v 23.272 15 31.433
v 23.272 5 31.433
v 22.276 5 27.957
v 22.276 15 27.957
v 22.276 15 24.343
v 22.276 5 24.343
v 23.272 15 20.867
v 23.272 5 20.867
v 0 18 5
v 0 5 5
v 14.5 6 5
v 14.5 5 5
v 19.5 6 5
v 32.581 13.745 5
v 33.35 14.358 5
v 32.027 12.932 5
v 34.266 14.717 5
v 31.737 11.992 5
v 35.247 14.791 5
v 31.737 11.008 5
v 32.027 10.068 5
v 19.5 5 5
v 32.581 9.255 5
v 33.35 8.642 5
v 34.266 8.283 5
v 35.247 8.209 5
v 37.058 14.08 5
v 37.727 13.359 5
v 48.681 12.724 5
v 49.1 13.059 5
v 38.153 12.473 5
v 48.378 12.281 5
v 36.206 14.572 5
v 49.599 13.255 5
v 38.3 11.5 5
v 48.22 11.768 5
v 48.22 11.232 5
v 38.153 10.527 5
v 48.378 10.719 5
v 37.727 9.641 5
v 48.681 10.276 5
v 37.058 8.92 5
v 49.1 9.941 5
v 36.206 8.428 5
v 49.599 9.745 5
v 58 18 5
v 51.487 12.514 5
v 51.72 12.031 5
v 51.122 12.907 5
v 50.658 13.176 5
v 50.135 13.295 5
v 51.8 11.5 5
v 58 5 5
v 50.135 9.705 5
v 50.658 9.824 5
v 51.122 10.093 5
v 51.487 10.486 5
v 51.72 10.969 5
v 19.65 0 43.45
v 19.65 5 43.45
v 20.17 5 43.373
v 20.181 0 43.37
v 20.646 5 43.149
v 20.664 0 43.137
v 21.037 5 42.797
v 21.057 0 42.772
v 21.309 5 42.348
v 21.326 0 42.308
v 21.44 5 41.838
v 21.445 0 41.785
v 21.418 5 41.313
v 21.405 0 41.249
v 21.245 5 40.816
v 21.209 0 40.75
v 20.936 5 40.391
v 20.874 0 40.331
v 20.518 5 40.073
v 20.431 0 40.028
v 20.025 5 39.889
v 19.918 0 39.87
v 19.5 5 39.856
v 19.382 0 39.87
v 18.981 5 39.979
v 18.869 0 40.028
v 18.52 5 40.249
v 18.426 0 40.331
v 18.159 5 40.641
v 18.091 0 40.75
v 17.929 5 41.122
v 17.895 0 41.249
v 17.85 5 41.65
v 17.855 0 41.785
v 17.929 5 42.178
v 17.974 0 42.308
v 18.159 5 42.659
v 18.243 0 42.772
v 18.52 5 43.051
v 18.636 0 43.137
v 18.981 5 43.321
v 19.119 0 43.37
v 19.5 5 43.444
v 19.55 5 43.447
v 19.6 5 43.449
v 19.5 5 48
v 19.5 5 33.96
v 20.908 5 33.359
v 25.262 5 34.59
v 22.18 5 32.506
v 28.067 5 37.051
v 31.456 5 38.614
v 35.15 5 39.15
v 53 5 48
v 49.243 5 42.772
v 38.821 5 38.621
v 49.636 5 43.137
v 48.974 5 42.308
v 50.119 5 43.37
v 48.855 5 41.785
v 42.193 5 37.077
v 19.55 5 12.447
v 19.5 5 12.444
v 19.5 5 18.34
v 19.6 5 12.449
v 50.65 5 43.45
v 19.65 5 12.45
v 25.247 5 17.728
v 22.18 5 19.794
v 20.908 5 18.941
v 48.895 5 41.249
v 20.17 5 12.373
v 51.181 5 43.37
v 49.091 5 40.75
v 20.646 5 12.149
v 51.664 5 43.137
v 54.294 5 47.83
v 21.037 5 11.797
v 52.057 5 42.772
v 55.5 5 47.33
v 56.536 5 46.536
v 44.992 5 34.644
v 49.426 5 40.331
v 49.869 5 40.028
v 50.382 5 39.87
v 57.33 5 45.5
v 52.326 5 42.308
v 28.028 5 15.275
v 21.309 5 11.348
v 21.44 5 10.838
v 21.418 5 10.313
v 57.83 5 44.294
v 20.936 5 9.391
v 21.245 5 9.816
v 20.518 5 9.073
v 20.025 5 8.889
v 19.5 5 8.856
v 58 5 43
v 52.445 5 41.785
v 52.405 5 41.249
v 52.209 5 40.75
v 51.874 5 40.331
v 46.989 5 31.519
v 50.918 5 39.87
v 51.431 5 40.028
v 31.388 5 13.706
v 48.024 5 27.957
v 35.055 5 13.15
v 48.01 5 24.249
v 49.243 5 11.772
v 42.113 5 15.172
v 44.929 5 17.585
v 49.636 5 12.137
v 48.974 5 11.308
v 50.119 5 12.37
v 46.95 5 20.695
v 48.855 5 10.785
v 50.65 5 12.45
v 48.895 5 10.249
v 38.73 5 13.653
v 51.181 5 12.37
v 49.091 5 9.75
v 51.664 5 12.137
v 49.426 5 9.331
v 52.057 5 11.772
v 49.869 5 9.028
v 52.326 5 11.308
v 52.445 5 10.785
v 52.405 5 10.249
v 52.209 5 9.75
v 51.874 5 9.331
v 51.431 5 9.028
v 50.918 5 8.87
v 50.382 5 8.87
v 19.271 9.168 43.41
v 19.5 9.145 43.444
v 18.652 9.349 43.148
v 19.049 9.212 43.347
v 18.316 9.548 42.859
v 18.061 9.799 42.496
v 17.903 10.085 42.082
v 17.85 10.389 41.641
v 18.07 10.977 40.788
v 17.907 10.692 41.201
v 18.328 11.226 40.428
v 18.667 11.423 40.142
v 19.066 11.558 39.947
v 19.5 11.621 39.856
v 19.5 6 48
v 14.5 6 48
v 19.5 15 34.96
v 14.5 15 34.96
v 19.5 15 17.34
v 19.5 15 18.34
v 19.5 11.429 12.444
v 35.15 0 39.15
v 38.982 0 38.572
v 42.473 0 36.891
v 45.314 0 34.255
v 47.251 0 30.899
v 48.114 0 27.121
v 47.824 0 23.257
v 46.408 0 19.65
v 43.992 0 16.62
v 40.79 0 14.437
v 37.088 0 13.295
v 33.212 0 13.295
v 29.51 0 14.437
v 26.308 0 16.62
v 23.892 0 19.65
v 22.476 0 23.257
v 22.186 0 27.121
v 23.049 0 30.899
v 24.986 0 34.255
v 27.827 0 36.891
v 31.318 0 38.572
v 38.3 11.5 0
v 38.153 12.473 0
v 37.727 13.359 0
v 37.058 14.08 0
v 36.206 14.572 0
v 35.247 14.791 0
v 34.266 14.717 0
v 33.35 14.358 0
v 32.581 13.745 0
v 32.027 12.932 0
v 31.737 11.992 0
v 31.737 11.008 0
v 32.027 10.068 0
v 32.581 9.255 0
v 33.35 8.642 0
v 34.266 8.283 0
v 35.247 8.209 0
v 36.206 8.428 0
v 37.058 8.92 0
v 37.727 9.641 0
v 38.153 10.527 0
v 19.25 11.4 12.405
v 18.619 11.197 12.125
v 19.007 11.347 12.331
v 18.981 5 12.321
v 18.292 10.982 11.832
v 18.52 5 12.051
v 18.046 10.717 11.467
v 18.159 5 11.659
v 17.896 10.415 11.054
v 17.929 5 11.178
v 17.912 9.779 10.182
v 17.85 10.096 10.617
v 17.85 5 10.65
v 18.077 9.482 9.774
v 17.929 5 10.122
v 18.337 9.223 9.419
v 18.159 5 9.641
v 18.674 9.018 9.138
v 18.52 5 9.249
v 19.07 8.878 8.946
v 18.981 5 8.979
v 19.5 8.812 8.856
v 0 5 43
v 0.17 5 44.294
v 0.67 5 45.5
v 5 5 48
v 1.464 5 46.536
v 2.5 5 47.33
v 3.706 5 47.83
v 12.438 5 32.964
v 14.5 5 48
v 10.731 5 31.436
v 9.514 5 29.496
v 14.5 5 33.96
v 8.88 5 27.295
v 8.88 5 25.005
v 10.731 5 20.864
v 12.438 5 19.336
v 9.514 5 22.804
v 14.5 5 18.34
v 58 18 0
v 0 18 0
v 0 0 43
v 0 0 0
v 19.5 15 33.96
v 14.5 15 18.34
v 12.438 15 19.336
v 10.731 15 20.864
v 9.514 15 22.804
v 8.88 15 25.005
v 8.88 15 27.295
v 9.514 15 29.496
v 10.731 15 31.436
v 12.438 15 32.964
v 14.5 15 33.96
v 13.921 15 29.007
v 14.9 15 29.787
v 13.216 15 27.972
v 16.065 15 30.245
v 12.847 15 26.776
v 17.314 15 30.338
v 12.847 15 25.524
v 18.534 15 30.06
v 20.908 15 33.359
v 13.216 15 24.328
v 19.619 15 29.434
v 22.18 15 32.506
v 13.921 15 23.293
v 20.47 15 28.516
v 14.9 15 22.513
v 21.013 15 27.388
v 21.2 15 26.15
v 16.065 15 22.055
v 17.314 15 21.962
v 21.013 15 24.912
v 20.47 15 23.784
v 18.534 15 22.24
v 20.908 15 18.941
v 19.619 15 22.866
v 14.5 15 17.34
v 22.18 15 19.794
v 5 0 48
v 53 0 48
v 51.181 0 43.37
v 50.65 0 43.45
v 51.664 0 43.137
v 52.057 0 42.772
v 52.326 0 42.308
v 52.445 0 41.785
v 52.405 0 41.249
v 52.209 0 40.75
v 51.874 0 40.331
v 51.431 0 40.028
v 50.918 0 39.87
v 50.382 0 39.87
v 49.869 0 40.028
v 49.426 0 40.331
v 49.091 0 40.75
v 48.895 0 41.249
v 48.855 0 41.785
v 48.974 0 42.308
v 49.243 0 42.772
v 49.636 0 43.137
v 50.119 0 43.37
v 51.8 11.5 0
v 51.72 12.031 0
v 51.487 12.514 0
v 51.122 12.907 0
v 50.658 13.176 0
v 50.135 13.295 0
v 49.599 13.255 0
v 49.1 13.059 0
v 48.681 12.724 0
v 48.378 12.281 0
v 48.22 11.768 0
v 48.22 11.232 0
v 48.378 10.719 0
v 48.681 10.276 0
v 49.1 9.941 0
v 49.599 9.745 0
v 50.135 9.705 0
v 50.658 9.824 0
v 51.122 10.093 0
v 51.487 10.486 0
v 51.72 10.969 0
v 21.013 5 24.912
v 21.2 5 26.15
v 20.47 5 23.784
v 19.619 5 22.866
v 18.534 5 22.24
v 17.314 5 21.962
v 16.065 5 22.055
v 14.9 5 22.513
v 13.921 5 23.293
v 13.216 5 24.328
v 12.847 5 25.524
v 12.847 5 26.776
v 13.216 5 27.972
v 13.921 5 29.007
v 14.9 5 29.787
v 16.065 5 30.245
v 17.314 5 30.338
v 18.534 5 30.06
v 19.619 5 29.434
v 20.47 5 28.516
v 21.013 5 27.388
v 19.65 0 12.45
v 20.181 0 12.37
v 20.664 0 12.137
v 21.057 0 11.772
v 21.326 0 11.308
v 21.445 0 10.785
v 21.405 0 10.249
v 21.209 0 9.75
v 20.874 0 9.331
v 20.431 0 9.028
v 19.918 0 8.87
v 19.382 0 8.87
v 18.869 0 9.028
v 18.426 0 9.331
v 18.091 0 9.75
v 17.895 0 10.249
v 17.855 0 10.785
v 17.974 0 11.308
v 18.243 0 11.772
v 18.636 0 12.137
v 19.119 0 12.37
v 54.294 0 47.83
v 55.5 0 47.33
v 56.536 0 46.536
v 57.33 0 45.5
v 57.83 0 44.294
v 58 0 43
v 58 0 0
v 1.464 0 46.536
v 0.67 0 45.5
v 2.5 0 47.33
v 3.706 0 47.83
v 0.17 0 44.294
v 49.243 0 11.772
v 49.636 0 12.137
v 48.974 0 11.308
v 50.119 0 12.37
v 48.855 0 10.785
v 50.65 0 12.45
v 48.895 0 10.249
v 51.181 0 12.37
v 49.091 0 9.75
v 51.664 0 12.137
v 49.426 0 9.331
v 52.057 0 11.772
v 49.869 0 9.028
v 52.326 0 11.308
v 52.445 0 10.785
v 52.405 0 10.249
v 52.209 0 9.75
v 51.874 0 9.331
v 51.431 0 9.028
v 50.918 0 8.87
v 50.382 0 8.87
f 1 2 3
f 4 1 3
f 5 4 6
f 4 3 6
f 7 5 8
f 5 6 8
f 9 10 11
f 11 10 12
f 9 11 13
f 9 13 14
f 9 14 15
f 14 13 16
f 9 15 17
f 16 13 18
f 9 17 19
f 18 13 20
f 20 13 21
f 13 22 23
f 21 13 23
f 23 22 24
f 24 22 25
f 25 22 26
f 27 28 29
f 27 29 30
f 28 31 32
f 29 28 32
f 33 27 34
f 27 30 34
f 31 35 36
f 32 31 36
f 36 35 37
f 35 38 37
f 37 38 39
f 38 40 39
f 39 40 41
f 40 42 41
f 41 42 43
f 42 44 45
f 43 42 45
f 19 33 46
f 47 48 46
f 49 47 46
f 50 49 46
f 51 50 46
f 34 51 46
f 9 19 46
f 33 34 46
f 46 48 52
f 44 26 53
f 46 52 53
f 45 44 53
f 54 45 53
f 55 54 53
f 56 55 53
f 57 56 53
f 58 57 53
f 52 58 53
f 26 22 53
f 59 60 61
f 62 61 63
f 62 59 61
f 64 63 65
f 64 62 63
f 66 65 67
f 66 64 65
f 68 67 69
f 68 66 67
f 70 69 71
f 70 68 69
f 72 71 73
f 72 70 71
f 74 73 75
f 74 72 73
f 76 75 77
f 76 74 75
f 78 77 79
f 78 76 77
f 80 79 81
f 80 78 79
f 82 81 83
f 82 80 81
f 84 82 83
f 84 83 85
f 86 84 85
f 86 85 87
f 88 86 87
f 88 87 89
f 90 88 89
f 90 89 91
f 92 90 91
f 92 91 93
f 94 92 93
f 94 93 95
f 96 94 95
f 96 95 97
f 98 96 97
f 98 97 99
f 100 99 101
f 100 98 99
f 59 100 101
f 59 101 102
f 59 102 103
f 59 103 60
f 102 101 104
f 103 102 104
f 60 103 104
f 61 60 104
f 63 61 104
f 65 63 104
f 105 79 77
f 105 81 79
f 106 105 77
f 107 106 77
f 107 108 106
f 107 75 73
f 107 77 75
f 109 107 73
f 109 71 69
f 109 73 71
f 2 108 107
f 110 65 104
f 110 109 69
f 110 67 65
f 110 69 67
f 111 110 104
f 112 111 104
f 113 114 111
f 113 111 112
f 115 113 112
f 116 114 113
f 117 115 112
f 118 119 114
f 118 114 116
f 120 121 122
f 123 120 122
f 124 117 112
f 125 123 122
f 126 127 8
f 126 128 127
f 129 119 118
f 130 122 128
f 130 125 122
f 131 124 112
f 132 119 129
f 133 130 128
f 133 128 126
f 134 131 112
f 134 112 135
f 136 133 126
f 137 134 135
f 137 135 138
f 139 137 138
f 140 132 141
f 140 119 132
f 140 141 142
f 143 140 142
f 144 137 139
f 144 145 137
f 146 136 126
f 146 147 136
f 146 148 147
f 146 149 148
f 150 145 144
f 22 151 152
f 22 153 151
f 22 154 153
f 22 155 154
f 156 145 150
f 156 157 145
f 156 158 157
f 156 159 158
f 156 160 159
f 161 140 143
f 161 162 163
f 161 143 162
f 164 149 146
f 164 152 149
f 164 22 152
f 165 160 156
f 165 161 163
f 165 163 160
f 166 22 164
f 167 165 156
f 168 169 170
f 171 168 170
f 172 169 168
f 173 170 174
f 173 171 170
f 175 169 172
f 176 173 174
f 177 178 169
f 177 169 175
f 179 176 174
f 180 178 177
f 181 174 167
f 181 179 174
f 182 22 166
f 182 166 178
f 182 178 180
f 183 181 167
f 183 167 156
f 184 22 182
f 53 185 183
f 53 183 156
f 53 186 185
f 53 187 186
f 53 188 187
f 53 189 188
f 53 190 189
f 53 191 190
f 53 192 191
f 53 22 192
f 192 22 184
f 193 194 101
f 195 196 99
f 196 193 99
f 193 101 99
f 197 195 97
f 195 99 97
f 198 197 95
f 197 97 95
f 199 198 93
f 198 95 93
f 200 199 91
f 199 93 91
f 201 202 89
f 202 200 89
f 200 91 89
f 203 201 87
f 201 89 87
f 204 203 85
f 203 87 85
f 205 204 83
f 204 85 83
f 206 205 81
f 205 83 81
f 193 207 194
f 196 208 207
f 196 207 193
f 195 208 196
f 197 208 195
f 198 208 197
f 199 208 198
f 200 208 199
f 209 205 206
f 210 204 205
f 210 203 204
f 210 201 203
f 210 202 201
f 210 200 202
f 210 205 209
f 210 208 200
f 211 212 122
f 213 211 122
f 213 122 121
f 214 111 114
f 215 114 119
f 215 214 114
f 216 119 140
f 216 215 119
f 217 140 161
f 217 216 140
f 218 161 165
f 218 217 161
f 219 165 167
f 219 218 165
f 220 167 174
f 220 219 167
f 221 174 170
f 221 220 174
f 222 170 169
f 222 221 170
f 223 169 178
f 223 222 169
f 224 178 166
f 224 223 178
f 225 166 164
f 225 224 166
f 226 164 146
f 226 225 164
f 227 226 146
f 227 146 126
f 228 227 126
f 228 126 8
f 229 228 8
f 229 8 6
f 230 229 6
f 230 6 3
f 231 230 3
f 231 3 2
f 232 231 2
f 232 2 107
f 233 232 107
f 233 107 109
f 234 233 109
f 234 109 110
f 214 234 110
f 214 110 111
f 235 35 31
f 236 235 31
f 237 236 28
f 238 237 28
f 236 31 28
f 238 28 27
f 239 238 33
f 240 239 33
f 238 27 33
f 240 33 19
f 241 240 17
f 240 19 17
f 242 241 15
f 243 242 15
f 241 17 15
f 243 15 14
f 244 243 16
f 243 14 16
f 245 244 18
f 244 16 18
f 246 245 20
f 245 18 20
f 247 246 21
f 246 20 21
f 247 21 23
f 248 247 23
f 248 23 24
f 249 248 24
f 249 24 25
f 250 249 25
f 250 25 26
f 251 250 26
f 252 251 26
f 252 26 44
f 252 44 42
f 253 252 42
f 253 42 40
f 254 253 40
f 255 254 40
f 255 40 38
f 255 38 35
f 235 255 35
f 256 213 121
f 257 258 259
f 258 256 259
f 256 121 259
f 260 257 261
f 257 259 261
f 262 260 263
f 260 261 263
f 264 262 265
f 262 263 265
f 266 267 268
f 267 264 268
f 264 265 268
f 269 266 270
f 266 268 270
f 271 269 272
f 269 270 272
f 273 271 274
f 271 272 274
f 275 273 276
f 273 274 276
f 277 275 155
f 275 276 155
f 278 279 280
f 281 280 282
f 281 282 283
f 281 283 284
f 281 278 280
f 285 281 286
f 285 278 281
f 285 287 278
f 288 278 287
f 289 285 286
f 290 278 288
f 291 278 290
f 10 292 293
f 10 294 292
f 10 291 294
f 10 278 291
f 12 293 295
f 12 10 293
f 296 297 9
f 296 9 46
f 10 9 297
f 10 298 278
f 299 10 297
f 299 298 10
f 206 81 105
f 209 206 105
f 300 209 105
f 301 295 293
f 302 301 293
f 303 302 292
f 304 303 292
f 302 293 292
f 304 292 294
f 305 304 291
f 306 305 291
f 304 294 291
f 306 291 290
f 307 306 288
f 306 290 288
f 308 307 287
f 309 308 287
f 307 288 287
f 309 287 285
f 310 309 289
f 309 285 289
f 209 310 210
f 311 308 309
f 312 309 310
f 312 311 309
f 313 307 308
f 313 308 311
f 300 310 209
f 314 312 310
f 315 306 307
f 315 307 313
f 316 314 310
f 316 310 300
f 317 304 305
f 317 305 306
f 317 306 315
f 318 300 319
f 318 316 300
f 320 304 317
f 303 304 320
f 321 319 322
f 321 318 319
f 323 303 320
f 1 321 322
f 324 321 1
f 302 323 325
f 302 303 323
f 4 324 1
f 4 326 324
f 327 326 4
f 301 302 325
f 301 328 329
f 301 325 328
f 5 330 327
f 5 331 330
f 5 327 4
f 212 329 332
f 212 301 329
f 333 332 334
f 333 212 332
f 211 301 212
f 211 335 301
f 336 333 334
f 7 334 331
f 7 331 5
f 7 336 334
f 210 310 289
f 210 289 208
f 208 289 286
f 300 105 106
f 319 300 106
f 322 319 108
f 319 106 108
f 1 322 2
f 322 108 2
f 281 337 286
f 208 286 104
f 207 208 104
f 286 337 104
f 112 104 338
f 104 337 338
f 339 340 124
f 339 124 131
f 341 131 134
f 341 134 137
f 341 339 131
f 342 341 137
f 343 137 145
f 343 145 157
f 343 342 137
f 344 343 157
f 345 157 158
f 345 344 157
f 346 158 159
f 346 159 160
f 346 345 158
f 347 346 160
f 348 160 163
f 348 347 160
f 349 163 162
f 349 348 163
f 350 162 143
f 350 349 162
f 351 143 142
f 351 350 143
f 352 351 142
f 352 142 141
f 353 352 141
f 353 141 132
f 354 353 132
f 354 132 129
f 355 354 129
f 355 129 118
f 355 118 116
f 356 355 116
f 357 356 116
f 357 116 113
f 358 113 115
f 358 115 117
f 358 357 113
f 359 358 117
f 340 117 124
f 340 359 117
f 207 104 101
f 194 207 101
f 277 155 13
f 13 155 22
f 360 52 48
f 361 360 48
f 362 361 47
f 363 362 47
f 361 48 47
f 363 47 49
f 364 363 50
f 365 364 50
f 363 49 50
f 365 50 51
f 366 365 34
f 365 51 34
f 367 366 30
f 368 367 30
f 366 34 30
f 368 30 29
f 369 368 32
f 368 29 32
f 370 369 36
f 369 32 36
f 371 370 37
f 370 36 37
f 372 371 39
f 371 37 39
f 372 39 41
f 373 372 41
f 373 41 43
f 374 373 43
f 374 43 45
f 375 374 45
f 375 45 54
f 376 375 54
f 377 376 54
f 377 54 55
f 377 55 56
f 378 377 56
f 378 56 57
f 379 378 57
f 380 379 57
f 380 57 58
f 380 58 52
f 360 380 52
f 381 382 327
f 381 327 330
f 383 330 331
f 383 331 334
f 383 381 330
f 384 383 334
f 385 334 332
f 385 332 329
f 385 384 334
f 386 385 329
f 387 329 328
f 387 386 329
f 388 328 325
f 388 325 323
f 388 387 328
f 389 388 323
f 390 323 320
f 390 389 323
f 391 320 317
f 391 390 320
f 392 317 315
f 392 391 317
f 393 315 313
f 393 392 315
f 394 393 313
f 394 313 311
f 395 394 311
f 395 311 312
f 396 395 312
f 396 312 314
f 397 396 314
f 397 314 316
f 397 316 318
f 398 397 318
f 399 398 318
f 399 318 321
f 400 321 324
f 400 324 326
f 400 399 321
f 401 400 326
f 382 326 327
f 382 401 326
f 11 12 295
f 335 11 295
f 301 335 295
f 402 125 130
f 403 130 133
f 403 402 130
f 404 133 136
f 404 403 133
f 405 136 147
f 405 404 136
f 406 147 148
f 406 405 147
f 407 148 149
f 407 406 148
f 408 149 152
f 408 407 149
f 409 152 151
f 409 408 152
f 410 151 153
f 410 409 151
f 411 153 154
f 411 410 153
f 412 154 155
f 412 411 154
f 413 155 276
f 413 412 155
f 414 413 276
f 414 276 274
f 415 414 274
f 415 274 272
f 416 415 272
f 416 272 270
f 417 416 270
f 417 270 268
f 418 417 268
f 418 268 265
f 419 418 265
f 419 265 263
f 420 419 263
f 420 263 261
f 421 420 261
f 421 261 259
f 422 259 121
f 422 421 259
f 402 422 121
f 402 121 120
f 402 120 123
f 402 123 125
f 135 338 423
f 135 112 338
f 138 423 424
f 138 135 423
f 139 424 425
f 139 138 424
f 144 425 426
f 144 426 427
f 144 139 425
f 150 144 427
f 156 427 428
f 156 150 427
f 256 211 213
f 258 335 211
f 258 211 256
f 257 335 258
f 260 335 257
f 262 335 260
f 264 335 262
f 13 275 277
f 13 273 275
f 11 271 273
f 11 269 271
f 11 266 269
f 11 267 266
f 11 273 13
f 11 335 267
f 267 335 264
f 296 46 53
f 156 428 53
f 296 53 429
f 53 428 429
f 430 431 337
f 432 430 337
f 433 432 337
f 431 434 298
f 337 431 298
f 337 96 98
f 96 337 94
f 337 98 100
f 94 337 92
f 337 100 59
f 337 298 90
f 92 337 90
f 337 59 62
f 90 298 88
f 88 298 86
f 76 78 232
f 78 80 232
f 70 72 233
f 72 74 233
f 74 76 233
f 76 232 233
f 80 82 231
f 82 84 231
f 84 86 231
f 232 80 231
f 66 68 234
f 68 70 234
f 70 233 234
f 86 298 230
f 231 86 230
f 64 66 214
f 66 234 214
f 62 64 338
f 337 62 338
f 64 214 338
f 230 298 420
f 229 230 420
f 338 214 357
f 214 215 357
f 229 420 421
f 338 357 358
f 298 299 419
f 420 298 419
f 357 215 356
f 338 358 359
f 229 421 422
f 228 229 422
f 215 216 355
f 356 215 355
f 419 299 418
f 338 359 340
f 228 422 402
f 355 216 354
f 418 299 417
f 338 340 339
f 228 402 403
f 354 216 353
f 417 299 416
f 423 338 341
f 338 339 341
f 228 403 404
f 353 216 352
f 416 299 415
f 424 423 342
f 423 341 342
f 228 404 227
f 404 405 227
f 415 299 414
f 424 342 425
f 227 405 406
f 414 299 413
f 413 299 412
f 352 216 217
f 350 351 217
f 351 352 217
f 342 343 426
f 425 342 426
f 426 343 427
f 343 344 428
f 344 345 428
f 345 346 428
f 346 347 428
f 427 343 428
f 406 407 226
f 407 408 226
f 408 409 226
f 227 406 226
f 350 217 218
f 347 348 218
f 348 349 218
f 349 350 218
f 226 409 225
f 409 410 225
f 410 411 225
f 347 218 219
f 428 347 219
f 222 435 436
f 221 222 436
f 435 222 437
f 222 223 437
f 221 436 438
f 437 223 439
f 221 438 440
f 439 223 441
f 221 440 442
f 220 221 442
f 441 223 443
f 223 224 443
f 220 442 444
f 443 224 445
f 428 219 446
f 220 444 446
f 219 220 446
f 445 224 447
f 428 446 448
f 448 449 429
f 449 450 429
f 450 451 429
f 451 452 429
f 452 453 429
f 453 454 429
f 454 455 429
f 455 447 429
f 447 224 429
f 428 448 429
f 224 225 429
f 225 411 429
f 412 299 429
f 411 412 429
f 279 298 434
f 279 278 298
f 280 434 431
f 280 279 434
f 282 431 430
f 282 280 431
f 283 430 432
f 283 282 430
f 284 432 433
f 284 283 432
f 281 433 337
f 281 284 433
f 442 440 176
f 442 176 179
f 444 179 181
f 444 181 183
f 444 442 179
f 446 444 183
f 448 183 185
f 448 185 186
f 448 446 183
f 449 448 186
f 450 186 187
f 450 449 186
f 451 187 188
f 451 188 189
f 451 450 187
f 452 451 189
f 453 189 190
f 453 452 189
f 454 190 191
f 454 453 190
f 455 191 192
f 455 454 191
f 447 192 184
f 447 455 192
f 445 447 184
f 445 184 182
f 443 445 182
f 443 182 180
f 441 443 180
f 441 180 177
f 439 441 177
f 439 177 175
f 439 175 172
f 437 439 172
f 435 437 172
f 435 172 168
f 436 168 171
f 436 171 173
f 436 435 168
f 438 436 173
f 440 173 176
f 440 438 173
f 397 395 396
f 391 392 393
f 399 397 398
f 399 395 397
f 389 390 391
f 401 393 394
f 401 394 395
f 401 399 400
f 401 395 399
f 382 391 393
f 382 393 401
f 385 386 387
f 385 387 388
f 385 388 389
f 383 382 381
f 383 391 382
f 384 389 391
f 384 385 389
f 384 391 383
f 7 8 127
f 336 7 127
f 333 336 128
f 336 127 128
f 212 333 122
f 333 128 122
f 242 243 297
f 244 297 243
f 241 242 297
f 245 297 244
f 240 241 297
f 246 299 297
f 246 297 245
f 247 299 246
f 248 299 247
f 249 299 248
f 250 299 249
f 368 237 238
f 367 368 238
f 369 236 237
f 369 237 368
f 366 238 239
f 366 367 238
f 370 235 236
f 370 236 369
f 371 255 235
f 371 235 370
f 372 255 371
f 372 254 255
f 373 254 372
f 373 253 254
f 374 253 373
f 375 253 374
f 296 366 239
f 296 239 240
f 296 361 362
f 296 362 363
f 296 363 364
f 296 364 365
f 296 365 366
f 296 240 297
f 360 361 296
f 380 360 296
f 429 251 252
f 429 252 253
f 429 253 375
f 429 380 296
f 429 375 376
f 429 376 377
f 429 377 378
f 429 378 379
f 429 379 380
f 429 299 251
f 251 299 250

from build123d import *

# Parameters (mm, degrees)
SKETCH1_W               = 58
SKETCH1_H               = 48
SKETCH1_R               = 13
SKETCH1_R_2             = 1.8
BOSS_EXTRUDE1_DEPTH     = 5
BOSS_EXTRUDE2_OUTLINE_R = 4.2
BOSS_EXTRUDE2_DEPTH     = 10
FILLET1_R               = 5
BOSS_EXTRUDE5_DEPTH     = 10
CUT_EXTRUDE2_DEPTH      = 67.492480778
SKETCH7_W               = 58
SKETCH7_H               = 5
BOSS_EXTRUDE6_DEPTH     = 13
SKETCH8_R               = 3.3
SKETCH8_R_2             = 1.8
CUT_EXTRUDE3_DEPTH      = 20


# Read off the part's stored shape, not the designer's step: Boss-Extrude2, Boss-Extrude5
with BuildPart() as part:
    # Sketch1 → Boss-Extrude1 (new body)
    with BuildSketch(Plane(origin=(0, 0, 0), x_dir=(1, 0, 0), z_dir=(0, 1, 0))):
        with Locations((29, -24)):
            Rectangle(SKETCH1_W, SKETCH1_H)
        with Locations(Location((35.15, -26.15, 0), (0, 0, 270))):
            Circle(SKETCH1_R, mode=Mode.SUBTRACT)
        with Locations(Location((19.65, -10.65, 0), (0, 0, 270))):
            Circle(SKETCH1_R_2, mode=Mode.SUBTRACT)
        with Locations(Location((19.65, -41.65, 0), (0, 0, 270))):
            Circle(SKETCH1_R_2, mode=Mode.SUBTRACT)
        with Locations(Location((50.65, -41.65, 0), (0, 0, 270))):
            Circle(SKETCH1_R_2, mode=Mode.SUBTRACT)
        with Locations(Location((50.65, -10.65, 0), (0, 0, 270))):
            Circle(SKETCH1_R_2, mode=Mode.SUBTRACT)
    extrude(amount=BOSS_EXTRUDE1_DEPTH)

    # Boss-Extrude2 outline → Boss-Extrude2 (add)
    with BuildSketch(Plane(origin=(0, 5, 0), x_dir=(1, 0, 0), z_dir=(0, 1, 0))):
        with BuildLine():
            ThreePointArc((23.271694215, -31.432598951), (22.15, -26.15), (23.271694215, -20.867401049))
            ThreePointArc((23.271694215, -20.867401049), (8.8, -26.15), (23.271694215, -31.432598951))
        make_face()
        with Locations((17, -26.15)):
            Circle(BOSS_EXTRUDE2_OUTLINE_R, mode=Mode.SUBTRACT)
    extrude(amount=BOSS_EXTRUDE2_DEPTH)

    # Fillet1
    fillet1_edges = [part.edges().sort_by_distance(p)[0] for p in [
        (58, 2.5, 48),
        (0, 2.5, 48),
    ]]
    fillet(fillet1_edges, radius=FILLET1_R)

    # Boss-Extrude5 outline → Boss-Extrude5 (add)
    with BuildSketch(Plane(origin=(0, 5, 0), x_dir=(1, 0, 0), z_dir=(0, 1, 0))):
        with BuildLine():
            ThreePointArc((19.5, -12.443739111), (17.85, -10.65), (19.5, -8.856260889))
            Line((19.5, -8.856260889), (19.5, -5))
            Line((19.5, -5), (14.5, -5))
            Line((14.5, -5), (14.5, -18.340390535))
            ThreePointArc((14.5, -18.340390535), (17, -17.95), (19.5, -18.340390535))
            Line((19.5, -18.340390535), (19.5, -12.443739111))
        make_face()
        with BuildLine():
            ThreePointArc((19.5, -33.959609465), (17, -34.35), (14.5, -33.959609465))
            Line((14.5, -33.959609465), (14.5, -48))
            Line((14.5, -48), (19.5, -48))
            Line((19.5, -48), (19.5, -43.443739111))
            ThreePointArc((19.5, -43.443739111), (17.85, -41.65), (19.5, -39.856260889))
            Line((19.5, -39.856260889), (19.5, -33.959609465))
        make_face()
    extrude(amount=BOSS_EXTRUDE5_DEPTH)

    # Sketch6 → Cut-Extrude2 (cut, through all)
    with BuildSketch(Plane.ZY.offset(-14.5)):
        Polygon((17.340390535, 15), (5, 6), (5, 15), align=None)
        Polygon((48, 6), (34.959609465, 15), (48, 15), align=None)
    extrude(amount=-CUT_EXTRUDE2_DEPTH, mode=Mode.SUBTRACT)

    # Sketch7 → Boss-Extrude6 (add)
    with BuildSketch(Plane(origin=(0, 5, 0), x_dir=(1, 0, 0), z_dir=(0, 1, 0))):
        with Locations((29, -2.5)):
            Rectangle(SKETCH7_W, SKETCH7_H)
    extrude(amount=BOSS_EXTRUDE6_DEPTH)

    # Sketch8 → Cut-Extrude3 (cut)
    with BuildSketch(Plane.XY.offset(5)):
        with Locations((35, 11.5)):
            Circle(SKETCH8_R)
        with Locations((50, 11.5)):
            Circle(SKETCH8_R_2)
    extrude(amount=-CUT_EXTRUDE3_DEPTH, mode=Mode.SUBTRACT)


solid = part.part
